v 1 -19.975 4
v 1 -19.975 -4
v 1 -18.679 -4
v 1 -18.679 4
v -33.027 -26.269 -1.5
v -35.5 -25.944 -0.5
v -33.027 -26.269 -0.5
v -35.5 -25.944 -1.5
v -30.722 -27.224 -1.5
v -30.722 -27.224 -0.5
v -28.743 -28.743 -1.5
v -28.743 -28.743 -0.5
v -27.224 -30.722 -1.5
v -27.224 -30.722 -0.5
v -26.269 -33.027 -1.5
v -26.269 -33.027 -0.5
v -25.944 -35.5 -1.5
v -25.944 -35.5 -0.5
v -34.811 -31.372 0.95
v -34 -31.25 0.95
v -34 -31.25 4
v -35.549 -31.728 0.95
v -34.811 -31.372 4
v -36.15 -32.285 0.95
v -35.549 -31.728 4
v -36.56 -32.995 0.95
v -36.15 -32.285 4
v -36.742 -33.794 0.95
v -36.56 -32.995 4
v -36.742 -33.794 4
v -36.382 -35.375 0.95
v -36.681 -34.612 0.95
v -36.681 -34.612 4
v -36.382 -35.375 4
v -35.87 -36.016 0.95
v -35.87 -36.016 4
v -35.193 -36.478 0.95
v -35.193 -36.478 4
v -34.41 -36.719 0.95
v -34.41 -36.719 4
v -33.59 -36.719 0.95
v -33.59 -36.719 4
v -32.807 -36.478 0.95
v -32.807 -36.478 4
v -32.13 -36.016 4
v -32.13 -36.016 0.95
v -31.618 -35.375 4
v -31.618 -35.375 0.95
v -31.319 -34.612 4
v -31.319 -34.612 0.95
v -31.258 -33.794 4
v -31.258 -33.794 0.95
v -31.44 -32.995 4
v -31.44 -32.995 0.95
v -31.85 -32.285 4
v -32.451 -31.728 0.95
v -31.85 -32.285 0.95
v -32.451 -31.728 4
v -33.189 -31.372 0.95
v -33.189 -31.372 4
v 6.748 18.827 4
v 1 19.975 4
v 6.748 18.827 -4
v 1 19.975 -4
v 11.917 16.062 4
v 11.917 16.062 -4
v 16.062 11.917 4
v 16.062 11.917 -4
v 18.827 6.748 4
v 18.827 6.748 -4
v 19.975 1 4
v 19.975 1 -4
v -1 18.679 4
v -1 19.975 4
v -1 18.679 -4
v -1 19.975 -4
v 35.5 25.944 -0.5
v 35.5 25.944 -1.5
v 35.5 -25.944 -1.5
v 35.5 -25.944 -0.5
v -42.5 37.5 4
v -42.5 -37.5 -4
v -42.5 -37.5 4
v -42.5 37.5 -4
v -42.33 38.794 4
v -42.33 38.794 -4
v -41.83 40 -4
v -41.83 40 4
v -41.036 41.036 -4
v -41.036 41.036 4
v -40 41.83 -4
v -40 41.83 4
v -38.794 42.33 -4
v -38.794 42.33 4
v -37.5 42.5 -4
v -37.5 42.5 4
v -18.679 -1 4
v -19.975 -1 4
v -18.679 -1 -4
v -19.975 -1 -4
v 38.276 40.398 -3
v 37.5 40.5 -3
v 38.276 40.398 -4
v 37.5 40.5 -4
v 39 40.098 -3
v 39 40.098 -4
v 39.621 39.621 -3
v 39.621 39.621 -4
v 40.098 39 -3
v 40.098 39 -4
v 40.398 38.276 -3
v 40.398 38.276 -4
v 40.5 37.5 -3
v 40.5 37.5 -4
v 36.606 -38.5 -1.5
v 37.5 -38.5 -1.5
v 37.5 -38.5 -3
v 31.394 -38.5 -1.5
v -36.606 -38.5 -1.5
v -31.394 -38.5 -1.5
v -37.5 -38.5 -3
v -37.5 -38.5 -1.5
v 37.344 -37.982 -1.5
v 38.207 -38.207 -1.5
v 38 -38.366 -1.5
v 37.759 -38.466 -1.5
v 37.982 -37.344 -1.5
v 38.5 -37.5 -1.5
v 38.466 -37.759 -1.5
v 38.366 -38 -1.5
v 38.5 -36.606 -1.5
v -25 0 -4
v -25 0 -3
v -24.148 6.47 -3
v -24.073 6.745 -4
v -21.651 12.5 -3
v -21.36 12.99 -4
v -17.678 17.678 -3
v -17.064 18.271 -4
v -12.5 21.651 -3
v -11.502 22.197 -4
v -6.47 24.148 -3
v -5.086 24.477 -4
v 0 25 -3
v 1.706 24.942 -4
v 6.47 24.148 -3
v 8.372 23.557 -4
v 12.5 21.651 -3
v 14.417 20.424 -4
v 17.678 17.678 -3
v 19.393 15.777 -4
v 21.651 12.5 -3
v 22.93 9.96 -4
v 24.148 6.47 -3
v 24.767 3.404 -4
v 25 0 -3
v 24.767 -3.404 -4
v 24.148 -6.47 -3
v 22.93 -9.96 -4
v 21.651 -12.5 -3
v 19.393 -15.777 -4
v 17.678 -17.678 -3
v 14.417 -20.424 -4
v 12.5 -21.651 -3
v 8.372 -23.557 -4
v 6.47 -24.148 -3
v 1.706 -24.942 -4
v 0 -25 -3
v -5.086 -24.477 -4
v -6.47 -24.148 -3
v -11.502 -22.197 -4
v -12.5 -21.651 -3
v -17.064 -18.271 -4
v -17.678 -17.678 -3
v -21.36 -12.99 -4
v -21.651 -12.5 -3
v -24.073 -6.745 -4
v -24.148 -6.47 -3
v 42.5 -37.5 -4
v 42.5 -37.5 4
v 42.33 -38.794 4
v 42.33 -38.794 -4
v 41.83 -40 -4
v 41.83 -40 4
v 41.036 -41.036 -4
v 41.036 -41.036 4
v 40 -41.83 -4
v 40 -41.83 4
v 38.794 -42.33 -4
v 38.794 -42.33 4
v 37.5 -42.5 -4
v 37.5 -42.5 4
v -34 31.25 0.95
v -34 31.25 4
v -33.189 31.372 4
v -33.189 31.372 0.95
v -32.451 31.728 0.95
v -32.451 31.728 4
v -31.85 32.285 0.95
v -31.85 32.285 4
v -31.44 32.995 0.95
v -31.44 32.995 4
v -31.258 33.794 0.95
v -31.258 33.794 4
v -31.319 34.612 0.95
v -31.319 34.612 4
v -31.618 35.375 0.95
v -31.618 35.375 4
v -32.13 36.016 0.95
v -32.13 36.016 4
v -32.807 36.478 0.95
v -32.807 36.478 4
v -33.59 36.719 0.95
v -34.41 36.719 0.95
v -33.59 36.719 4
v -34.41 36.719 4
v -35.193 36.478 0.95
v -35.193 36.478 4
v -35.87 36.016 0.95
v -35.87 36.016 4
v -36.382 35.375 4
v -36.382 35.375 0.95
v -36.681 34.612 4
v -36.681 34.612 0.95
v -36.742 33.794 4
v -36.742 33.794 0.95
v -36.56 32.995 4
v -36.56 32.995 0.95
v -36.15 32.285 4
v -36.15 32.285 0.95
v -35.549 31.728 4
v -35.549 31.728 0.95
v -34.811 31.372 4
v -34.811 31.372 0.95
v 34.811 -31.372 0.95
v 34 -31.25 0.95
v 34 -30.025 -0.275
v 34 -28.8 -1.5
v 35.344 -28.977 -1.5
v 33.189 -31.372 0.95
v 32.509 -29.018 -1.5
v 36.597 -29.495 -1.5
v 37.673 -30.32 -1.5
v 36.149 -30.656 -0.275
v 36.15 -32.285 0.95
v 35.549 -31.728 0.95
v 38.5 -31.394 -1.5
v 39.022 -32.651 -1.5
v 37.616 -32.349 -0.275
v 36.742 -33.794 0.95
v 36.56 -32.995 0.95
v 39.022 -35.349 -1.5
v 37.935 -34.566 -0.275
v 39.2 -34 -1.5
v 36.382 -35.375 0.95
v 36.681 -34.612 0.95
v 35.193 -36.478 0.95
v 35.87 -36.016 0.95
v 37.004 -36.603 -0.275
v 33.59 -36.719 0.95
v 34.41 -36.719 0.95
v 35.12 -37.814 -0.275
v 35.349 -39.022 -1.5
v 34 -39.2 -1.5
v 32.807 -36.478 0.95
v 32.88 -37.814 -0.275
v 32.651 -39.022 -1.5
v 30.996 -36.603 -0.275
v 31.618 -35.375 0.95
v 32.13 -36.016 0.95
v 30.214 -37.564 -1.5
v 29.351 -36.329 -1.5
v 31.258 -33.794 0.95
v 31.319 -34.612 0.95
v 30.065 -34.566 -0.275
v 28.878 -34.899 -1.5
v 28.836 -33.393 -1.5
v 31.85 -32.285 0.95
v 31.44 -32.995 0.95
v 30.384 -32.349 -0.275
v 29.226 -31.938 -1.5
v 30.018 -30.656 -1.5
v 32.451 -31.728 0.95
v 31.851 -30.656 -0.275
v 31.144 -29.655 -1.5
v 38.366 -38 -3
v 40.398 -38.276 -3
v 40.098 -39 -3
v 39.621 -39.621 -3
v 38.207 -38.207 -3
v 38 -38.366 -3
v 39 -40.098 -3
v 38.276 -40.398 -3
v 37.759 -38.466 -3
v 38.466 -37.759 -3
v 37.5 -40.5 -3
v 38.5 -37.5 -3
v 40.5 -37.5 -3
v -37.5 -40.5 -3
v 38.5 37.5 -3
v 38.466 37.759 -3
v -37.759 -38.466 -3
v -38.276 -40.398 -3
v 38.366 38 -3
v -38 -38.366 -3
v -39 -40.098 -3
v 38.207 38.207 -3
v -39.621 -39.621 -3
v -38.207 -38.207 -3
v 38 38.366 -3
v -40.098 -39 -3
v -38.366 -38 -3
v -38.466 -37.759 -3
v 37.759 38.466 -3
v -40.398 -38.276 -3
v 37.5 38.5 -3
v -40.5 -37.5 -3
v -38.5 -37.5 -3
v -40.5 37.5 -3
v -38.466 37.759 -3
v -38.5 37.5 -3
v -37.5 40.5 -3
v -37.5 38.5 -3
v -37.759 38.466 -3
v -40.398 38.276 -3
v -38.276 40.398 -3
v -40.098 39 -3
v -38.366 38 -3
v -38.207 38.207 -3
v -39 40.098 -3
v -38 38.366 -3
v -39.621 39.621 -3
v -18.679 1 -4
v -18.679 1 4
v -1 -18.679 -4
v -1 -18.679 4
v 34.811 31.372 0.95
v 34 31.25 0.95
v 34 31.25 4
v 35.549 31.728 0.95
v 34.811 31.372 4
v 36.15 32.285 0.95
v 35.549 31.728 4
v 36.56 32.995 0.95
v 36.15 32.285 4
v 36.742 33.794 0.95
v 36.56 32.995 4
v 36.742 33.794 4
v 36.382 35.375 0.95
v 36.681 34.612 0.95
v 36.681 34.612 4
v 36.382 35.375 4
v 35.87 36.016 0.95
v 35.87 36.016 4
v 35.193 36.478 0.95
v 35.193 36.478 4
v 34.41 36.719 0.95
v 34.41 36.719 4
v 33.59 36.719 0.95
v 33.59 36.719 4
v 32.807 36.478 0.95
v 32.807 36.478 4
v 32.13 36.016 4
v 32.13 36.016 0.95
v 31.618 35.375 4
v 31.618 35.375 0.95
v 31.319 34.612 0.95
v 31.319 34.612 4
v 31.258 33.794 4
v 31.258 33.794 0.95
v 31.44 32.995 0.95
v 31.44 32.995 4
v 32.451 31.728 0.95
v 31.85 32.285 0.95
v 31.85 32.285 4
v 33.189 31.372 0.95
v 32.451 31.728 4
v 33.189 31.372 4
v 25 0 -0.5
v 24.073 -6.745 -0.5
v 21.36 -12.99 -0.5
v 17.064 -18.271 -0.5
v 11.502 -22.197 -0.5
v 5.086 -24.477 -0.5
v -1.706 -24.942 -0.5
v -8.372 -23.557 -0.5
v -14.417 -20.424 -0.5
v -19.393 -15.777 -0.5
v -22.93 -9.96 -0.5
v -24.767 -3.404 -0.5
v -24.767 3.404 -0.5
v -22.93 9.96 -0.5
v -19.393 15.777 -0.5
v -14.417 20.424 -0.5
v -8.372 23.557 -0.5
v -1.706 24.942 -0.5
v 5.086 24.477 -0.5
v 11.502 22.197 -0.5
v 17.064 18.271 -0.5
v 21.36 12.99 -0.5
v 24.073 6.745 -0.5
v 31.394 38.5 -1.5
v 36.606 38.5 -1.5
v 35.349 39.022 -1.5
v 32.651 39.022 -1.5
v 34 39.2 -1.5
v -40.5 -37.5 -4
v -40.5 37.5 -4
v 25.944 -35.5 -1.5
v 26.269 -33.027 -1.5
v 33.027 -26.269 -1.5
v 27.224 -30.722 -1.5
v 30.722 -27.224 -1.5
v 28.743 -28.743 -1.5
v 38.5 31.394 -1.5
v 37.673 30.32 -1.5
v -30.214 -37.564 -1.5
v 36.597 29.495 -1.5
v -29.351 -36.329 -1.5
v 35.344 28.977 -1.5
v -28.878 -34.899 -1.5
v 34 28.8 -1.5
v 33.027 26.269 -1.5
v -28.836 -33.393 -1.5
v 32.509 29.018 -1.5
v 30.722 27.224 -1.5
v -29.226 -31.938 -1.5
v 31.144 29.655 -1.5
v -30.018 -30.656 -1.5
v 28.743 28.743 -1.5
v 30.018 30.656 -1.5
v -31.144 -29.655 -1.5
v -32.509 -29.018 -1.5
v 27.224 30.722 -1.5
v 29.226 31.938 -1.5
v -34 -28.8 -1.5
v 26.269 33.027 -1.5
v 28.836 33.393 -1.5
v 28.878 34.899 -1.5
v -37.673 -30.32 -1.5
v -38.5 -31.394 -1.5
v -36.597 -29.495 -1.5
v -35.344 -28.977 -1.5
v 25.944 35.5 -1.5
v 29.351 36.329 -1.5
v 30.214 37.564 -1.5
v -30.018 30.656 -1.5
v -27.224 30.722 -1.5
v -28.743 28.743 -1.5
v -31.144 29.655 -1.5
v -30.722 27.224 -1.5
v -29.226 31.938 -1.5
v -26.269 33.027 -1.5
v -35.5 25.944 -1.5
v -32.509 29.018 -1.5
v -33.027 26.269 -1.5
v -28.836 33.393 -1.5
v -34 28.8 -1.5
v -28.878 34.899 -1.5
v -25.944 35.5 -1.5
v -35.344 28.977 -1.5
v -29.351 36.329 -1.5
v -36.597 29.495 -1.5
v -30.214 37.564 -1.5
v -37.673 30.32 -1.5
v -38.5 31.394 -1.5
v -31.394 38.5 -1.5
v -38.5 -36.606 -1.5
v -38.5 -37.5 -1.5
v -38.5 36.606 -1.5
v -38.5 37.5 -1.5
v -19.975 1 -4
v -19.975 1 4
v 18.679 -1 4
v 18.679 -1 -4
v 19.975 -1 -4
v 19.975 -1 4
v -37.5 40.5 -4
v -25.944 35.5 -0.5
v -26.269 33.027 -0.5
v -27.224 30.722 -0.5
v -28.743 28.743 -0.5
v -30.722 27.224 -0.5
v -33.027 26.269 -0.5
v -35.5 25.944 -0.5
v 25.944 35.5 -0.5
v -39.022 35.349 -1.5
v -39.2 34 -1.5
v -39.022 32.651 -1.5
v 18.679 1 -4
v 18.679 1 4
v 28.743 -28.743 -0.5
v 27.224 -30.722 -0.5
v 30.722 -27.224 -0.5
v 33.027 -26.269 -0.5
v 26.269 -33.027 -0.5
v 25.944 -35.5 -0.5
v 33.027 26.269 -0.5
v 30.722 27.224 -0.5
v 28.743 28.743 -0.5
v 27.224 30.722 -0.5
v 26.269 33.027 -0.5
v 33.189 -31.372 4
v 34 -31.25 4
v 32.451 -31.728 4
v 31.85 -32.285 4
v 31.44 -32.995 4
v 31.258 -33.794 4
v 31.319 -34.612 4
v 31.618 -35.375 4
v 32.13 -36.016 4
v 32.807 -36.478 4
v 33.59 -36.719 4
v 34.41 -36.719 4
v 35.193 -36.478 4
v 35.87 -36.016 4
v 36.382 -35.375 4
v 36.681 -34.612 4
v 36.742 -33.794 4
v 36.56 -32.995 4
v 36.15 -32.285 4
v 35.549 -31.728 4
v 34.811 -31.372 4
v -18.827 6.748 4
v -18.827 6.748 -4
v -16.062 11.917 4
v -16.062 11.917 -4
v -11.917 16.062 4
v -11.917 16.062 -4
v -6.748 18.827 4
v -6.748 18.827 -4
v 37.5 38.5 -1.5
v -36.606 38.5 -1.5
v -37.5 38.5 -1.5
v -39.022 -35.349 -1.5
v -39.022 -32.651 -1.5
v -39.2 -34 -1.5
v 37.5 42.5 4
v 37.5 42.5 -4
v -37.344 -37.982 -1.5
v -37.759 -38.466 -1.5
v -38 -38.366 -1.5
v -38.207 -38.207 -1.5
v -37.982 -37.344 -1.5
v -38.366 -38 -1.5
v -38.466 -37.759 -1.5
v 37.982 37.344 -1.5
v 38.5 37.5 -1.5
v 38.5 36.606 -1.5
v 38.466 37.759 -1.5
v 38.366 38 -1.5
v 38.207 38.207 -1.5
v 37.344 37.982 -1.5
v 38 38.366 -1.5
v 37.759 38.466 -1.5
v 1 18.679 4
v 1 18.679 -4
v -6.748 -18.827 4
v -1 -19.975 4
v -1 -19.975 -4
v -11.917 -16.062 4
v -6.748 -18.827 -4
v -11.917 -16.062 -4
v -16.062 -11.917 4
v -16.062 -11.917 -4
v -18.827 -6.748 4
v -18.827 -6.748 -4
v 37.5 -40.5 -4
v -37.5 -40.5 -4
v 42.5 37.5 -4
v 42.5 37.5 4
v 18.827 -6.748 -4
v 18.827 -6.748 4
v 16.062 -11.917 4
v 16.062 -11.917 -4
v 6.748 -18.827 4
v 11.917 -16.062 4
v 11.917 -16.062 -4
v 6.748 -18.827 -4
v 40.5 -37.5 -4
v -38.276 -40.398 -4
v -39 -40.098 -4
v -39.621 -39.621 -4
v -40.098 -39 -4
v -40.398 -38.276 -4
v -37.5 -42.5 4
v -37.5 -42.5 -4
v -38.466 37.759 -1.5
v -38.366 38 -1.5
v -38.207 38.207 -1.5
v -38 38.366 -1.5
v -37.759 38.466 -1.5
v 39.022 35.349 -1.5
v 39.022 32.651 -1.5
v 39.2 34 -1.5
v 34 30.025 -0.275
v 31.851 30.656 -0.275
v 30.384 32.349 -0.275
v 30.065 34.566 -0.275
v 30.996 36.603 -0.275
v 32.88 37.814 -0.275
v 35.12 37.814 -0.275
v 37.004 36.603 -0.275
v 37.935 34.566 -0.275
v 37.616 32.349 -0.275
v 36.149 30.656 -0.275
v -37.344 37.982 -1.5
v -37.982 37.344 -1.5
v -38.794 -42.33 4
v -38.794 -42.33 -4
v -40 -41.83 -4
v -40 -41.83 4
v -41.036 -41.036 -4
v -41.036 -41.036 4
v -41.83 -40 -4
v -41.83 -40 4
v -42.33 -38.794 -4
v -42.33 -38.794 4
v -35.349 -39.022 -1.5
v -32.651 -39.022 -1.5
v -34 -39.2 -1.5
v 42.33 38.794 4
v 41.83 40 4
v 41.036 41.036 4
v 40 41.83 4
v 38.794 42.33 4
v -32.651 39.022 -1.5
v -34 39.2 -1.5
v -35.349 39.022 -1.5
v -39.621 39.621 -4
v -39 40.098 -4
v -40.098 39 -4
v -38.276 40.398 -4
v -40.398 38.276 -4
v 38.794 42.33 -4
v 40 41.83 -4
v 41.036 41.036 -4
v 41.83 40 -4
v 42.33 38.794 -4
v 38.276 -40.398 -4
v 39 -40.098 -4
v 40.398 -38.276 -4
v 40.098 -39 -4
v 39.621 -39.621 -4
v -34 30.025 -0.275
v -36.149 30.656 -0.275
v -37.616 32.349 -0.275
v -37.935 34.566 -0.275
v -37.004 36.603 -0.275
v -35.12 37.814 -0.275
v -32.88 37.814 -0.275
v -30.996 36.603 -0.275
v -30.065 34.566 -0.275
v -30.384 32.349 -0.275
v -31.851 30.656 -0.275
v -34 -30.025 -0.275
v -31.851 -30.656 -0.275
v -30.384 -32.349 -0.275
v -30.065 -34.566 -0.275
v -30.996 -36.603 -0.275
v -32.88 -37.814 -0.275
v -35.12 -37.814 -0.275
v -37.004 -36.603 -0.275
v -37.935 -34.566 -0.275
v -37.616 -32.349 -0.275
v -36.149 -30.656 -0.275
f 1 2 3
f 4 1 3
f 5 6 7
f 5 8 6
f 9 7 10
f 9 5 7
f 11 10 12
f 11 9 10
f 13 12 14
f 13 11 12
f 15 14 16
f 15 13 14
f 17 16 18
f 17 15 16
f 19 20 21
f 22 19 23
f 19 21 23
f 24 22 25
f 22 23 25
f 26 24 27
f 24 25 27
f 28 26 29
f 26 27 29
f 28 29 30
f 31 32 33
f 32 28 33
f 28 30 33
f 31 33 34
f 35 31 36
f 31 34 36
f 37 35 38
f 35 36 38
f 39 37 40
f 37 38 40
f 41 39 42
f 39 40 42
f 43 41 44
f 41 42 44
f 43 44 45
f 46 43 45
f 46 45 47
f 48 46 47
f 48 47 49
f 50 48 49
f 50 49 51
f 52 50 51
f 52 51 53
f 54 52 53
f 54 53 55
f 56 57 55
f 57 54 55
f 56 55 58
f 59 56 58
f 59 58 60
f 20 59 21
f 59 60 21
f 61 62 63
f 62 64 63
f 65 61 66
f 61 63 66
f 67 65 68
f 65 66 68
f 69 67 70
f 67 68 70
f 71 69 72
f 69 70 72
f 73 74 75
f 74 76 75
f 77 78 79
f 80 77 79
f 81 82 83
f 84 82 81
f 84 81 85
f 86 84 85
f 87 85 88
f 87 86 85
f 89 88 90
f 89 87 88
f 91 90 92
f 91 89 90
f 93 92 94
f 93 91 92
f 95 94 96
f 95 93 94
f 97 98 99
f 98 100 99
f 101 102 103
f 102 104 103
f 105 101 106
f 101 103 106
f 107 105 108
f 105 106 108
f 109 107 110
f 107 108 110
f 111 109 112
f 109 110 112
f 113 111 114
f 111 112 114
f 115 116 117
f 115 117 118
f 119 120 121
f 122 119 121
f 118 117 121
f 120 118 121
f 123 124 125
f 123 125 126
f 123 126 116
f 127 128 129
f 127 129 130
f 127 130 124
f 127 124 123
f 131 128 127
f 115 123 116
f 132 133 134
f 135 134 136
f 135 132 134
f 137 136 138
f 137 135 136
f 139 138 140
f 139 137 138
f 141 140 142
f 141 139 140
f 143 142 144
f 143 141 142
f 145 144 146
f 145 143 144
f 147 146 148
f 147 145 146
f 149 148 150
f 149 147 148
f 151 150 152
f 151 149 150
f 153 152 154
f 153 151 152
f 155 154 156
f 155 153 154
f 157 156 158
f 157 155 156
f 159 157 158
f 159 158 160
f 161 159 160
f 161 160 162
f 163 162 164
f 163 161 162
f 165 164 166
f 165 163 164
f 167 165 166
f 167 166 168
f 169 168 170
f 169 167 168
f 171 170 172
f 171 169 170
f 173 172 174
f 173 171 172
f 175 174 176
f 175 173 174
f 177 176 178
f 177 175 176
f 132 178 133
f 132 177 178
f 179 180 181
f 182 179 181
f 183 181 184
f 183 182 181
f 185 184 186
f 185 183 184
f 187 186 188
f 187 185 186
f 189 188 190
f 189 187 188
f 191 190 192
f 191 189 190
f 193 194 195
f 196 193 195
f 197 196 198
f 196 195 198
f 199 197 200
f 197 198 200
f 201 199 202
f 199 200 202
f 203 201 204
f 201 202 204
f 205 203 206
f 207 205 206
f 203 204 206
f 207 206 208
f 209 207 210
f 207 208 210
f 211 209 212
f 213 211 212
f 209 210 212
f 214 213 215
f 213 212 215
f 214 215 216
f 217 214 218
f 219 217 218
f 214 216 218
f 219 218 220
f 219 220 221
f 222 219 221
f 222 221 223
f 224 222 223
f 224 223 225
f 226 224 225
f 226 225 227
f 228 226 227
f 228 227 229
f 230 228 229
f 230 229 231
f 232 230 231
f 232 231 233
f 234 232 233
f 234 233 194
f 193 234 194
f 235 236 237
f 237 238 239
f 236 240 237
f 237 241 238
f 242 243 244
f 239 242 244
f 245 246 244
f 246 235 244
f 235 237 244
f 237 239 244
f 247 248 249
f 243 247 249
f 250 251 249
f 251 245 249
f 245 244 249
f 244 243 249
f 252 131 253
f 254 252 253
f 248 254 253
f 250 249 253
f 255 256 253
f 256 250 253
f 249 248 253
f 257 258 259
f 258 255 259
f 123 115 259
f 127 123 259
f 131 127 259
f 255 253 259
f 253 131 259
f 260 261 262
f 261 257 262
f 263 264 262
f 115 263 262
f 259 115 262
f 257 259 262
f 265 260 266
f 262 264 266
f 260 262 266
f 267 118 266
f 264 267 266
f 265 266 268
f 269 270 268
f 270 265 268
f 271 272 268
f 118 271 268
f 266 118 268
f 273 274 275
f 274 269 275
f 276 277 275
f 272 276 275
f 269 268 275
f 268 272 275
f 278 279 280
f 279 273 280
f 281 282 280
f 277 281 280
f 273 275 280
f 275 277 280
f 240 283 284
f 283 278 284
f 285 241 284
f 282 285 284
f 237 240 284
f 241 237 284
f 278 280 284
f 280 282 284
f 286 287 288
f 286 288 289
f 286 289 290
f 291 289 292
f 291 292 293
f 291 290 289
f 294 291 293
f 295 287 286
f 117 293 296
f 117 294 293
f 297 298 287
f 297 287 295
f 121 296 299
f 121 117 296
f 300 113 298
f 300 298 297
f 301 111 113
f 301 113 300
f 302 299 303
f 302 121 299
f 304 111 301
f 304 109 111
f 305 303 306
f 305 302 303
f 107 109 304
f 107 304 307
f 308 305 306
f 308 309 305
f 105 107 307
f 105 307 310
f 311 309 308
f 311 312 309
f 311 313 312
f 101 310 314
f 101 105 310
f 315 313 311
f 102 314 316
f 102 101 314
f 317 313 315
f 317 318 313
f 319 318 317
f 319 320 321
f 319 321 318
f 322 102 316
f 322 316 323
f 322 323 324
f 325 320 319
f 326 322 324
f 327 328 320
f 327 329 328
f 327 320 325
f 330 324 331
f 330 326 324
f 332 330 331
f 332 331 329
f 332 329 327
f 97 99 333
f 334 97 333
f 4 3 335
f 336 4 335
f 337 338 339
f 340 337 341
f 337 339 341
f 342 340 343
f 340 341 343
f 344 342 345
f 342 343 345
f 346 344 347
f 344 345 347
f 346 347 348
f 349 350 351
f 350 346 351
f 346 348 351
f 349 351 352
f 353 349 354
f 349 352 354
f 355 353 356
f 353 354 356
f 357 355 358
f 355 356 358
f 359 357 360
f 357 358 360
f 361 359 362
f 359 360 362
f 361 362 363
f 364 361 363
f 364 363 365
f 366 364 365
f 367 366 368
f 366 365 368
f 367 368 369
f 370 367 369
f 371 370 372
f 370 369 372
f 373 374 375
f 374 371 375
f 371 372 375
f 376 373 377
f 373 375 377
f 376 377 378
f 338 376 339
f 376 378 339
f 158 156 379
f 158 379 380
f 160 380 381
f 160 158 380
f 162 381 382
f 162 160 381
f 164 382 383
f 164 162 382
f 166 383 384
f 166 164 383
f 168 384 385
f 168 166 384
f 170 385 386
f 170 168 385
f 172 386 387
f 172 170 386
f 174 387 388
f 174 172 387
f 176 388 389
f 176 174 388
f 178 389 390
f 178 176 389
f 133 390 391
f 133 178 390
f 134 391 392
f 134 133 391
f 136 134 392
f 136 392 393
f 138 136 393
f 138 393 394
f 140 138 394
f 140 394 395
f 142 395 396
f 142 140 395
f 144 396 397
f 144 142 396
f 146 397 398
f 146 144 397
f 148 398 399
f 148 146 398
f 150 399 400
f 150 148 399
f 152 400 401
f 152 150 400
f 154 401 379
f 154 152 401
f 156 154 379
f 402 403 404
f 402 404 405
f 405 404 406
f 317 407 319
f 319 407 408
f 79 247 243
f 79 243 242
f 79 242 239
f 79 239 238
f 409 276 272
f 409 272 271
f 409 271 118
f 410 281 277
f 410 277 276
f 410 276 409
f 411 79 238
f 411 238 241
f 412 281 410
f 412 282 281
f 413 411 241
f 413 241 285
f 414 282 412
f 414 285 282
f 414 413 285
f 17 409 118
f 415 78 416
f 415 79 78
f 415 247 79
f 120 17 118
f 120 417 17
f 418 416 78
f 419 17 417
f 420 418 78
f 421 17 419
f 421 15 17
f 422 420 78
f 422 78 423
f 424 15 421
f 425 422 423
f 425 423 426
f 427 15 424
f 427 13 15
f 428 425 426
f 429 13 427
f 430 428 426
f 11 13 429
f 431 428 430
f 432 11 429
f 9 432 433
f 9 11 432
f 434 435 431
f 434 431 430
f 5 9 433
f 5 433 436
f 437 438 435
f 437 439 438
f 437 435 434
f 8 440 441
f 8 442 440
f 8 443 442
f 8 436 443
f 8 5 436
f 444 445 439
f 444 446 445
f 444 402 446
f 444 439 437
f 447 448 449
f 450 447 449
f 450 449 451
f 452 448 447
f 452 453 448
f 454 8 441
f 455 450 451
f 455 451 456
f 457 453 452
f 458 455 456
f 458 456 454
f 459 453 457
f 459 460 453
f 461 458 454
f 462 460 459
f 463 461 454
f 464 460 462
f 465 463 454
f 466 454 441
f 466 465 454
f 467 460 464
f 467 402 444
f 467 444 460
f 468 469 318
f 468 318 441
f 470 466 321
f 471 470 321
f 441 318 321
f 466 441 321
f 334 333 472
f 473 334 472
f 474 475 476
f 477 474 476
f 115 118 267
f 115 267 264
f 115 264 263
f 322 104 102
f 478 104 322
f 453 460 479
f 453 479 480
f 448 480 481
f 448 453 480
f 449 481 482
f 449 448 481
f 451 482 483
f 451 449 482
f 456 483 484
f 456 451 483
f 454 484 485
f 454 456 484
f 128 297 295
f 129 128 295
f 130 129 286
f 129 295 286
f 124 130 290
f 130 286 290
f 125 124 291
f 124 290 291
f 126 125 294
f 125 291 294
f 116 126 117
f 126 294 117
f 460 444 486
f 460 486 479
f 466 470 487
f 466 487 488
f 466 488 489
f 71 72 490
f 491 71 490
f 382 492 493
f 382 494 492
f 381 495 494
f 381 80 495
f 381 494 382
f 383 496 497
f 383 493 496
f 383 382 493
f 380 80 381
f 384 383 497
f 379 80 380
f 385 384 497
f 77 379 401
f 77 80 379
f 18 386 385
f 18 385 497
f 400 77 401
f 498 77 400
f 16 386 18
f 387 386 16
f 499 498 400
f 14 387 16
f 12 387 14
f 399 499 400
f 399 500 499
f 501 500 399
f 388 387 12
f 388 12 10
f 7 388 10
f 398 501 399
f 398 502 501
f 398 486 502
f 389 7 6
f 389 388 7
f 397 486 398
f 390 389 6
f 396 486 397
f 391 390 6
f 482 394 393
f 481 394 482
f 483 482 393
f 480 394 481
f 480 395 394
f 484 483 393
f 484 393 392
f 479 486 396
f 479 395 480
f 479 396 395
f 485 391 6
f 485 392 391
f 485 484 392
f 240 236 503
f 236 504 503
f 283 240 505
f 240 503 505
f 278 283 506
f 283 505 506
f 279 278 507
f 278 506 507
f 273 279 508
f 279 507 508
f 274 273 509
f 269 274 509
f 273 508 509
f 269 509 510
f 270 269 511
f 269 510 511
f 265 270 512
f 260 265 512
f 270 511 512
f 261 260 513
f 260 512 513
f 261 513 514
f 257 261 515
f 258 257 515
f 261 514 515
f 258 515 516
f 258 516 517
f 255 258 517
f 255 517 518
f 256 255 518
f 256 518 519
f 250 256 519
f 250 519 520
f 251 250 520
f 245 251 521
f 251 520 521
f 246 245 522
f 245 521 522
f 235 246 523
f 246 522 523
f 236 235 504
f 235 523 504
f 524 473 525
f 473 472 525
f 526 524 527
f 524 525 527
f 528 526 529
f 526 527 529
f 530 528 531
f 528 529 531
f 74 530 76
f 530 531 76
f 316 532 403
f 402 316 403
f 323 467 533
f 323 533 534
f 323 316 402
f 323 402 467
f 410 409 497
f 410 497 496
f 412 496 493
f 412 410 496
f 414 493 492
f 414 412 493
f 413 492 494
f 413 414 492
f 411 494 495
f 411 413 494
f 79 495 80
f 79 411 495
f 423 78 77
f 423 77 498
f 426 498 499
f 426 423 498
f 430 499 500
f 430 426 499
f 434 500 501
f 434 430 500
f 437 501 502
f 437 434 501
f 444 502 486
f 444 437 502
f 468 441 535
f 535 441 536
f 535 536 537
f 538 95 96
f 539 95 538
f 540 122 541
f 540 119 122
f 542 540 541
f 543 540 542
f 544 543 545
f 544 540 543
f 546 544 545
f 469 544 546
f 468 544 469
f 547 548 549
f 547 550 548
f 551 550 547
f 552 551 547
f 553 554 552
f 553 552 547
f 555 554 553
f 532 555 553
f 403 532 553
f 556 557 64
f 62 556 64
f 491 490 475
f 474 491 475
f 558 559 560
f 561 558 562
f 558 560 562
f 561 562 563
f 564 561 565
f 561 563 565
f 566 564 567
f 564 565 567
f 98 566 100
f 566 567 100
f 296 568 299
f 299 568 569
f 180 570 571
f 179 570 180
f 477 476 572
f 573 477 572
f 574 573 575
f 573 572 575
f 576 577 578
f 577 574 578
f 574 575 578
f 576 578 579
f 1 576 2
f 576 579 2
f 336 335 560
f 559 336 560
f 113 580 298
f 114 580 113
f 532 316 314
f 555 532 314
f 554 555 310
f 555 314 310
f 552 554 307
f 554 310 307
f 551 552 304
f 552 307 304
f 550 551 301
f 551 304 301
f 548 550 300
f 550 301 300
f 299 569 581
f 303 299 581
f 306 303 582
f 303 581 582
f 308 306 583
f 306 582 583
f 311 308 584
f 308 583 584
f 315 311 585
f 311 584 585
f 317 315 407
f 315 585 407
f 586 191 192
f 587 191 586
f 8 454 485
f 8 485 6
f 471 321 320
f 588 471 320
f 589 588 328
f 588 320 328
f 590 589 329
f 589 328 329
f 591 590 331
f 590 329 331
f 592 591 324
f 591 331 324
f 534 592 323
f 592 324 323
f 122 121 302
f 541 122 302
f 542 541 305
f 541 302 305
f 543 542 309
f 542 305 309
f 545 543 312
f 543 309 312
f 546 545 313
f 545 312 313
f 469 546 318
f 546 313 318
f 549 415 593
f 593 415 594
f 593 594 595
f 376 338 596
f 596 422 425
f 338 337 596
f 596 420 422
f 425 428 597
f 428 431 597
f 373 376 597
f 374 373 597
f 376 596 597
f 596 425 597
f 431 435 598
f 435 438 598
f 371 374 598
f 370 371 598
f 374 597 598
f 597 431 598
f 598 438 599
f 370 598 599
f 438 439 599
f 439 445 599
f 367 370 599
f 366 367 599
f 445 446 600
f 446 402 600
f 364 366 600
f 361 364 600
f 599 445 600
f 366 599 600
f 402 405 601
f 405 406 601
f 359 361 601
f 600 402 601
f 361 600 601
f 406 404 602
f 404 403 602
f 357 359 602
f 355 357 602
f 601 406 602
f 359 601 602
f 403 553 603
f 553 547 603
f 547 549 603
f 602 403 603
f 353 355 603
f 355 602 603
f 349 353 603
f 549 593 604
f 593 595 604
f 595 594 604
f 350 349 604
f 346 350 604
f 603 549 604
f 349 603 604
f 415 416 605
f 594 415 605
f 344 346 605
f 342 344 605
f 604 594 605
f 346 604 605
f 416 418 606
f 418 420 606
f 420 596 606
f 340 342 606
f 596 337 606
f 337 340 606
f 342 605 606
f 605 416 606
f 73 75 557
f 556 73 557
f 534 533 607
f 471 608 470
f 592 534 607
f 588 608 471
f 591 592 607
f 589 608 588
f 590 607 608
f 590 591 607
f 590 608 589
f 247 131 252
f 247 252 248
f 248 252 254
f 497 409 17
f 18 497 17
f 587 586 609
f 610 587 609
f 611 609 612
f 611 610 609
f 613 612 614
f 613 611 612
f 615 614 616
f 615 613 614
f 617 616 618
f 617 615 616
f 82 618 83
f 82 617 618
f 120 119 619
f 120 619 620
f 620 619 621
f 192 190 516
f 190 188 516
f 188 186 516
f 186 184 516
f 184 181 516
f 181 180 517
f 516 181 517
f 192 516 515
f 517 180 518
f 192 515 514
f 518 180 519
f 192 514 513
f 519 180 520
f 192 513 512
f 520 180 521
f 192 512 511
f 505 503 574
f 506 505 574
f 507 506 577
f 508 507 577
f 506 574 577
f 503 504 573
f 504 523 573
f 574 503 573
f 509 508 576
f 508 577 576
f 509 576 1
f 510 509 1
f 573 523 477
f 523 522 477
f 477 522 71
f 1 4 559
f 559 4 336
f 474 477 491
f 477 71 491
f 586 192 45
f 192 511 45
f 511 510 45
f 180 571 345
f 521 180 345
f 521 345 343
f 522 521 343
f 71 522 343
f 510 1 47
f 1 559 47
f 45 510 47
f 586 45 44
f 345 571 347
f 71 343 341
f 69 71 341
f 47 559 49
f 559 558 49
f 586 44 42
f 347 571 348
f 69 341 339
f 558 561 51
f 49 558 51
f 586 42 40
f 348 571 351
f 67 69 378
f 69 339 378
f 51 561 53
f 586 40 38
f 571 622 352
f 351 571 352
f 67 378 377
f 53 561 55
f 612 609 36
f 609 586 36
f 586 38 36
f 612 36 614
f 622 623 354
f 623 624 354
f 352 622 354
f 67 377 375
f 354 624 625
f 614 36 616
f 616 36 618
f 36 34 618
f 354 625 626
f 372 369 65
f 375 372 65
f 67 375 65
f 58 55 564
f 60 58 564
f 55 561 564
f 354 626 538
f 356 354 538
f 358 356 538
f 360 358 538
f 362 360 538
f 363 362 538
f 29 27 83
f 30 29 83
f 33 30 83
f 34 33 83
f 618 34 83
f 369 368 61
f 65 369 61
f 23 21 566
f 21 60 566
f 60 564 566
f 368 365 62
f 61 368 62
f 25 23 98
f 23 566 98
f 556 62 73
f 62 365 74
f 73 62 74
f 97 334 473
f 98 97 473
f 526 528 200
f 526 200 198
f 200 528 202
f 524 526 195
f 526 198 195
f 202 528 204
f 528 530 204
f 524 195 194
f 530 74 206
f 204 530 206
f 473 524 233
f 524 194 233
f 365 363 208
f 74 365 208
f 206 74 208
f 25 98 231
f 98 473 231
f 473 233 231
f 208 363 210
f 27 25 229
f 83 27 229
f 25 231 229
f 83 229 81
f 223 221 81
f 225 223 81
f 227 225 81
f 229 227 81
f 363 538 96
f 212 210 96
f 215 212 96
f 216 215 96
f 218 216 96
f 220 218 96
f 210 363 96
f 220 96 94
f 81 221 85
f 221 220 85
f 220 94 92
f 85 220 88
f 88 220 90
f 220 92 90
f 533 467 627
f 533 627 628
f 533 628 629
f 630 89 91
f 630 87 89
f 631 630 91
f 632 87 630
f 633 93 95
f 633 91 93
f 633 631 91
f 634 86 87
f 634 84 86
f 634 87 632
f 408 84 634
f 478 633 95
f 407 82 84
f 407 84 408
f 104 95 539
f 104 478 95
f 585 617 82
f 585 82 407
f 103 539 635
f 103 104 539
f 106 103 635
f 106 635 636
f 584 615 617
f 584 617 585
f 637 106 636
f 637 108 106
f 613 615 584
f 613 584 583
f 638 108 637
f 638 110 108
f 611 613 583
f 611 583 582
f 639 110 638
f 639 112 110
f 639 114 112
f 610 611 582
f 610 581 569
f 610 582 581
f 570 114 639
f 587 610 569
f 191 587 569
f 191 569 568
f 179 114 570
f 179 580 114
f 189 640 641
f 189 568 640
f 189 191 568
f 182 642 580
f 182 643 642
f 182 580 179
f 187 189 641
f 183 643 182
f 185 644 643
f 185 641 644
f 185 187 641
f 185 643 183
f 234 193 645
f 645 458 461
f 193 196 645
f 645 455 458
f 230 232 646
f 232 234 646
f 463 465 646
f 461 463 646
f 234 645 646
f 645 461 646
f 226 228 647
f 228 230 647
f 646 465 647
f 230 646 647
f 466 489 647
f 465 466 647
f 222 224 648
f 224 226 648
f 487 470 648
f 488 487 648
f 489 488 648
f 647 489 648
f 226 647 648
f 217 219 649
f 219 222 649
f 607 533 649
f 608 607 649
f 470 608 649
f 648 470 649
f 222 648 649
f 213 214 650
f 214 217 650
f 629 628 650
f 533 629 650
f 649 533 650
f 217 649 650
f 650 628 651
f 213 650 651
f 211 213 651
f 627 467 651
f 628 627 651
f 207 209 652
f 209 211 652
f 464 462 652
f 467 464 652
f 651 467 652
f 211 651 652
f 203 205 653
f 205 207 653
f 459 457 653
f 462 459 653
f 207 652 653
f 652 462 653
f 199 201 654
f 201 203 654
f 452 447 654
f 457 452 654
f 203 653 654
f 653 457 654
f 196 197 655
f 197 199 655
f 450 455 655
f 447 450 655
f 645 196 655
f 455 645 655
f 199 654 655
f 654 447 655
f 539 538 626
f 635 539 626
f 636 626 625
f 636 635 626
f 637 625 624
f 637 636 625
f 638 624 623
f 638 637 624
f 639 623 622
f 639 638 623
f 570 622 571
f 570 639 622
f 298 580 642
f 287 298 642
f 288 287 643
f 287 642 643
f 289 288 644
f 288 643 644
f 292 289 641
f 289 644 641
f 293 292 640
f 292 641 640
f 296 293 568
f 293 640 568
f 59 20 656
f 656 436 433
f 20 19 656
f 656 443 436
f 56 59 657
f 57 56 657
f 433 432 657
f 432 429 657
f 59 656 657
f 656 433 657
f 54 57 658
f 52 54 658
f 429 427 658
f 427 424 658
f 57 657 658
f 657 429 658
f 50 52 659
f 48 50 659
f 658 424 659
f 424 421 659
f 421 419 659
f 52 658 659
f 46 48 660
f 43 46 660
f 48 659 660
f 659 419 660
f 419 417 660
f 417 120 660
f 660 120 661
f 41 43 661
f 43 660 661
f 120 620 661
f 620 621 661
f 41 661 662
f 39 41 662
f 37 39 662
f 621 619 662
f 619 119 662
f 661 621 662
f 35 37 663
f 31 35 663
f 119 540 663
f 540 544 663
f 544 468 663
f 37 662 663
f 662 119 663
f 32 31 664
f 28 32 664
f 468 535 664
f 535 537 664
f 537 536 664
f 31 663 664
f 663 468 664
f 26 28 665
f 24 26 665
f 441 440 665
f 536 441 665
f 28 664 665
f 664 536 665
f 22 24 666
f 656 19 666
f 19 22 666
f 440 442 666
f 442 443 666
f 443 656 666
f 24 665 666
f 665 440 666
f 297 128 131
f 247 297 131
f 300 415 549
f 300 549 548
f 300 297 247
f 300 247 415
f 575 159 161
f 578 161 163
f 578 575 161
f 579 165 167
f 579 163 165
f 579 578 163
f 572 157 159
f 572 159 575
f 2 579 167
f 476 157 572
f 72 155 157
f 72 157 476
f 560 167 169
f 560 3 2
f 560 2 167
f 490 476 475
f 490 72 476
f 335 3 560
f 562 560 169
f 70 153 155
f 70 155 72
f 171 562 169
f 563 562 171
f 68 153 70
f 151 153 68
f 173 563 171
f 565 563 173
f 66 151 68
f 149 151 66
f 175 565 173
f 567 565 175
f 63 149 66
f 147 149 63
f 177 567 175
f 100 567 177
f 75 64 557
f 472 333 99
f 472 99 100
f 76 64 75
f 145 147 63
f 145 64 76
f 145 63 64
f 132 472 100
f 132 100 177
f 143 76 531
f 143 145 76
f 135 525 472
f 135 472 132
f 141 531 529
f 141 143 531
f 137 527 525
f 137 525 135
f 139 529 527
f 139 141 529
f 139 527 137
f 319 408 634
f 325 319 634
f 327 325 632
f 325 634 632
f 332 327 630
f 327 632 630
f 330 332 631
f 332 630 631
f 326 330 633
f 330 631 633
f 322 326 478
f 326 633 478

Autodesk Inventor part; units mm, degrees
ref_plane "YZ Plane" through (0, 0, 0) normal (1, 0, 0) x (0, 1, 0)
ref_plane "XZ Plane" through (0, 0, 0) normal (0, 1, 0) x (-1, 0, 0)
ref_plane "XY Plane" through (0, 0, 0) normal (0, 0, 1) x (1, 0, 0)
sketch "Schizzo1" plane through (0, 0, 0) normal (0, 0, 1) x (1, 0, 0)
  line L0 (37.5, -42.5) -> (-37.5, -42.5)
  line L1 (-42.5, -37.5) -> (-42.5, 37.5)
  line L2 (-37.5, 42.5) -> (37.5, 42.5)
  line L3 (42.5, 37.5) -> (42.5, -37.5)
  line L4 (42.5, -42.5) -> (-42.5, 42.5) construction
  line L5 (-42.5, -42.5) -> (42.5, 42.5) construction
  arc A0 (-42.5, -37.5) -> (-37.5, -42.5) centre (-37.5, -37.5) ccw
  line L6 (-42.5, 42.5) -> (42.5, -42.5) construction
  arc A1 (-37.5, 42.5) -> (-42.5, 37.5) centre (-37.5, 37.5) ccw
  arc A2 (37.5, -42.5) -> (42.5, -37.5) centre (37.5, -37.5) ccw
  arc A3 (42.5, 37.5) -> (37.5, 42.5) centre (37.5, 37.5) ccw
  circle A4 centre (-34, -34) radius 5.2
  circle A5 centre (-34, 34) radius 5.2
  circle A6 centre (34, -34) radius 5.2
  circle A7 centre (34, 34) radius 5.2
  circle A8 centre (0, 0) radius 12
  circle A9 centre (0, 0) radius 20
  dimension "d12" = 85
  dimension "d17" = 10.4
  dimension "d18" = 24
  dimension "d19" = 40
extrude "Estrusione1" add sketch "Schizzo1" along normal mid plane 8 contours L0 A0 L1 A1 L2 A3 L3 A2
sketch "Schizzo2" plane through (0, 0, -4) normal (0, 0, -1) x (-1, 0, 0)
  circle A0 centre (-34, 34) radius 5.2 projected
  circle A1 centre (-34, 34) radius 5.2
  circle A2 centre (-34, 34) radius 2.5
  line L0 (-37.5, 42.5) -> (37.5, 42.5) projected
  line L1 (0, 42.5) -> (0, -42.5)
  line L2 (-37.5, -42.5) -> (37.5, -42.5) projected
  line L3 (-42.5, -37.5) -> (-42.5, 37.5) projected
  line L4 (-42.5, 0) -> (42.5, 0)
  line L5 (42.5, 37.5) -> (42.5, -37.5) projected
  circle A3 centre (34, 34) radius 5.2
  circle A4 centre (34, 34) radius 2.5
  circle A5 centre (-34, -34) radius 5.2
  circle A6 centre (-34, -34) radius 2.5
  circle A7 centre (34, -34) radius 2.5
  circle A8 centre (34, -34) radius 5.2
  point P0 (0, 0)
  dimension "d22" = 5
extrude "Estrusione2" add sketch "Schizzo2" against normal blind 8 contours A3
mirror "Speculare1" about plane through (0, 0, 0) normal (1, 0, 0) of "Estrusione2"
mirror "Speculare2" about plane through (0, 0, 0) normal (0, 1, 0) of "Estrusione2", "Speculare1"
sketch "Schizzo3" plane through (0, 0, -4) normal (0, 0, -1) x (-1, 0, 0)
  line L0 (37.5, -42.5) -> (-37.5, -42.5) projected
  line L1 (0, -42.5) -> (0, -40.5)
  line L2 (-37.5, -40.5) -> (37.5, -40.5)
  line L3 (-42.5, -37.5) -> (-42.5, 37.5) projected
  line L4 (-42.5, 0) -> (42.5, 0)
  line L5 (42.5, 37.5) -> (42.5, -37.5) projected
  line L6 (0, -42.5) -> (0, 42.5)
  line L7 (-37.5, 42.5) -> (37.5, 42.5) projected
  line L8 (-37.5, 40.5) -> (37.5, 40.5)
  line L9 (-42.5, 0) -> (-40.5, 0)
  line L10 (-40.5, -37.5) -> (-40.5, 37.5)
  line L11 (40.5, -37.5) -> (40.5, 37.5)
  arc A0 (37.5, -40.5) -> (40.5, -37.5) centre (37.5, -37.5) ccw
  arc A1 (-40.5, -37.5) -> (-37.5, -40.5) centre (-37.5, -37.5) ccw
  arc A2 (40.5, 37.5) -> (37.5, 40.5) centre (37.5, 37.5) ccw
  arc A3 (-37.5, 40.5) -> (-40.5, 37.5) centre (-37.5, 37.5) ccw
  circle A4 centre (0, 0) radius 20 projected
  circle A5 centre (0, 0) radius 25
  dimension "d25" = 2
  dimension "d27" = 2
extrude "Estrusione3" cut sketch "Schizzo3" against normal blind 1 contours A1 L10 L4 A5 L6 L2 | L6 A5 L4 L11 A0 L2 | L10 A3 L8 L6 A5 L4 | A5 L6 L8 A2 L11 L4
sketch "Schizzo4" plane through (0, 0, -3) normal (0, 0, -1) x (-1, 0, 0)
  line L0 (37.5, -40.5) -> (-37.5, -40.5) projected
  line L1 (0, -40.5) -> (0, -38.5)
  line L2 (-37.5, -38.5) -> (37.5, -38.5)
  line L3 (-42.5, 37.5) -> (-42.5, -37.5) projected
  line L4 (-37.5, -42.5) -> (37.5, -42.5) projected
  line L5 (37.5, 42.5) -> (-37.5, 42.5) projected
  line L6 (-37.5, 38.5) -> (37.5, 38.5)
  line L7 (-38.4396, 0) -> (-0.9396, 0) construction
  line L8 (-40.5, -37.5) -> (-40.5, 37.5) projected
  line L9 (-40.5, 0) -> (-38.5, 0)
  line L10 (-38.5, -37.5) -> (-38.5, 37.5)
  arc A0 (-37.5, 38.5) -> (-38.5, 37.5) centre (-37.5, 37.5) ccw
  line L11 (38.5, -37.5) -> (38.5, 37.5)
  arc A1 (38.5, 37.5) -> (37.5, 38.5) centre (37.5, 37.5) ccw
  arc A2 (-38.5, -37.5) -> (-37.5, -38.5) centre (-37.5, -37.5) ccw
  arc A3 (37.5, -38.5) -> (38.5, -37.5) centre (37.5, -37.5) ccw
  point P0 (0, 0)
  dimension "d31" = 2
  dimension "d35" = 2
  dimension "d36" = 75
extrude "Estrusione4" cut sketch "Schizzo4" against normal blind 1.5 from surface at 0
sketch "Schizzo5" plane through (37.5, -38.5, -1.5) normal (0, 0, -1) x (-1, 0, 0)
  circle A0 centre (3.5, 4.5) radius 2.5 projected
  circle A1 centre (3.5, 4.5) radius 2.5
  point P0 (37.5, 38.5)
hole "Foro1" at (34, -34, -1.5) direction (0, 0, 1) diameter 5.5 end through all countersink diameter 10.4 countersink angle 90 clearance for "Vite a testa svasata piana ISO 2009/7046" size "M5" standard "ISO"
mirror "Speculare3" about plane through (0, 0, 0) normal (1, 0, 0) of "Foro1"
mirror "Speculare4" about plane through (0, 0, 0) normal (0, 1, 0) of "Foro1", "Speculare3"
sketch "Schizzo6" plane through (31.3942, -38.5, -1.5) normal (0, 0, -1) x (-1, 0, 0)
  line L0 (62.7885, 0) -> (0, 0) projected
  line L1 (31.3942, 0) -> (31.3942, 3)
  line L2 (31.3942, 3) -> (57.3377, 3)
  line L3 (31.3942, 3) -> (5.4507, 3)
  line L4 (-7.1058, 1) -> (-7.1058, 76) projected
  line L5 (-7.1058, 38.5) -> (-4.1058, 38.5)
  line L6 (-4.1058, 38.5) -> (-4.1058, 64.4435)
  line L7 (-4.1058, 38.5) -> (-4.1058, 12.5565)
  line L8 (-11.1058, 1) -> (-11.1058, 76) projected
  line L9 (-11.1058, 38.5) -> (73.8942, 38.5)
  line L10 (73.8942, 76) -> (73.8942, 1) projected
  line L11 (31.3942, -3.9455) -> (31.3942, 81)
  line L12 (-6.1058, 81) -> (68.8942, 81) projected
  line L13 (31.3942, 74) -> (57.3377, 74)
  line L14 (31.3942, 74) -> (5.4507, 74)
  line L15 (66.8942, 38.5) -> (66.8942, 64.4435)
  line L16 (66.8942, 38.5) -> (66.8942, 12.5565)
  arc A0 (66.8942, 12.5565) -> (57.3377, 3) centre (66.8942, 3) ccw
  arc A1 (57.3377, 74) -> (66.8942, 64.4435) centre (66.8942, 74) ccw
  arc A2 (5.4507, 3) -> (-4.1058, 12.5565) centre (-4.1058, 3) ccw
  arc A3 (-4.1058, 64.4435) -> (5.4507, 74) centre (-4.1058, 74) ccw
  point P0 (31.3942, 38.5)
  dimension "d46" = 3
  dimension "d47" = 25.9435
  dimension "d48" = 25.9435
  dimension "d49" = 3
  dimension "d51" = 25.9435
extrude "Estrusione5" cut sketch "Schizzo6" against normal blind 1
sketch "Schizzo8" plane through (0, 0, -4) normal (0, 0, -1) x (-1, 0, 0)
  line L0 (-1, 21.321) -> (1, 21.321)
  line L1 (1, 21.321) -> (1, 18.679)
  line L2 (1, 18.679) -> (-1, 18.679)
  line L3 (-1, 18.679) -> (-1, 21.321)
  circle A0 centre (0, 0) radius 20 projected
  line L4 (-1, 21.321) -> (1, 18.679) construction
  line L5 (1, 21.321) -> (-1, 18.679) construction
  point P0 (0, 20)
  point P1 (1, 19.975)
  point P2 (-1, 19.975)
  dimension "d54" = 2
  dimension "d55" = 2.642
sketch "Schizzo9" plane through (0, 0, -3) normal (0, 0, 1) x (1, 0, 0)
  circle A0 centre (0, 0) radius 25
  circle A1 centre (0, 0) radius 20
  dimension "d56" = 50
extrude "Estrusione6" add sketch "Schizzo9" along normal blind 2.7
extrude "Estrusione7" add sketch "Schizzo8" against normal blind 8 contours A0 L1 L2 L3 picked at (0.1112, 19.1184)
pattern_circular "Serie circolare1" count 4 over 360 about axis through (0, 0, 0) along (0, 0, 1) of "Estrusione7"
